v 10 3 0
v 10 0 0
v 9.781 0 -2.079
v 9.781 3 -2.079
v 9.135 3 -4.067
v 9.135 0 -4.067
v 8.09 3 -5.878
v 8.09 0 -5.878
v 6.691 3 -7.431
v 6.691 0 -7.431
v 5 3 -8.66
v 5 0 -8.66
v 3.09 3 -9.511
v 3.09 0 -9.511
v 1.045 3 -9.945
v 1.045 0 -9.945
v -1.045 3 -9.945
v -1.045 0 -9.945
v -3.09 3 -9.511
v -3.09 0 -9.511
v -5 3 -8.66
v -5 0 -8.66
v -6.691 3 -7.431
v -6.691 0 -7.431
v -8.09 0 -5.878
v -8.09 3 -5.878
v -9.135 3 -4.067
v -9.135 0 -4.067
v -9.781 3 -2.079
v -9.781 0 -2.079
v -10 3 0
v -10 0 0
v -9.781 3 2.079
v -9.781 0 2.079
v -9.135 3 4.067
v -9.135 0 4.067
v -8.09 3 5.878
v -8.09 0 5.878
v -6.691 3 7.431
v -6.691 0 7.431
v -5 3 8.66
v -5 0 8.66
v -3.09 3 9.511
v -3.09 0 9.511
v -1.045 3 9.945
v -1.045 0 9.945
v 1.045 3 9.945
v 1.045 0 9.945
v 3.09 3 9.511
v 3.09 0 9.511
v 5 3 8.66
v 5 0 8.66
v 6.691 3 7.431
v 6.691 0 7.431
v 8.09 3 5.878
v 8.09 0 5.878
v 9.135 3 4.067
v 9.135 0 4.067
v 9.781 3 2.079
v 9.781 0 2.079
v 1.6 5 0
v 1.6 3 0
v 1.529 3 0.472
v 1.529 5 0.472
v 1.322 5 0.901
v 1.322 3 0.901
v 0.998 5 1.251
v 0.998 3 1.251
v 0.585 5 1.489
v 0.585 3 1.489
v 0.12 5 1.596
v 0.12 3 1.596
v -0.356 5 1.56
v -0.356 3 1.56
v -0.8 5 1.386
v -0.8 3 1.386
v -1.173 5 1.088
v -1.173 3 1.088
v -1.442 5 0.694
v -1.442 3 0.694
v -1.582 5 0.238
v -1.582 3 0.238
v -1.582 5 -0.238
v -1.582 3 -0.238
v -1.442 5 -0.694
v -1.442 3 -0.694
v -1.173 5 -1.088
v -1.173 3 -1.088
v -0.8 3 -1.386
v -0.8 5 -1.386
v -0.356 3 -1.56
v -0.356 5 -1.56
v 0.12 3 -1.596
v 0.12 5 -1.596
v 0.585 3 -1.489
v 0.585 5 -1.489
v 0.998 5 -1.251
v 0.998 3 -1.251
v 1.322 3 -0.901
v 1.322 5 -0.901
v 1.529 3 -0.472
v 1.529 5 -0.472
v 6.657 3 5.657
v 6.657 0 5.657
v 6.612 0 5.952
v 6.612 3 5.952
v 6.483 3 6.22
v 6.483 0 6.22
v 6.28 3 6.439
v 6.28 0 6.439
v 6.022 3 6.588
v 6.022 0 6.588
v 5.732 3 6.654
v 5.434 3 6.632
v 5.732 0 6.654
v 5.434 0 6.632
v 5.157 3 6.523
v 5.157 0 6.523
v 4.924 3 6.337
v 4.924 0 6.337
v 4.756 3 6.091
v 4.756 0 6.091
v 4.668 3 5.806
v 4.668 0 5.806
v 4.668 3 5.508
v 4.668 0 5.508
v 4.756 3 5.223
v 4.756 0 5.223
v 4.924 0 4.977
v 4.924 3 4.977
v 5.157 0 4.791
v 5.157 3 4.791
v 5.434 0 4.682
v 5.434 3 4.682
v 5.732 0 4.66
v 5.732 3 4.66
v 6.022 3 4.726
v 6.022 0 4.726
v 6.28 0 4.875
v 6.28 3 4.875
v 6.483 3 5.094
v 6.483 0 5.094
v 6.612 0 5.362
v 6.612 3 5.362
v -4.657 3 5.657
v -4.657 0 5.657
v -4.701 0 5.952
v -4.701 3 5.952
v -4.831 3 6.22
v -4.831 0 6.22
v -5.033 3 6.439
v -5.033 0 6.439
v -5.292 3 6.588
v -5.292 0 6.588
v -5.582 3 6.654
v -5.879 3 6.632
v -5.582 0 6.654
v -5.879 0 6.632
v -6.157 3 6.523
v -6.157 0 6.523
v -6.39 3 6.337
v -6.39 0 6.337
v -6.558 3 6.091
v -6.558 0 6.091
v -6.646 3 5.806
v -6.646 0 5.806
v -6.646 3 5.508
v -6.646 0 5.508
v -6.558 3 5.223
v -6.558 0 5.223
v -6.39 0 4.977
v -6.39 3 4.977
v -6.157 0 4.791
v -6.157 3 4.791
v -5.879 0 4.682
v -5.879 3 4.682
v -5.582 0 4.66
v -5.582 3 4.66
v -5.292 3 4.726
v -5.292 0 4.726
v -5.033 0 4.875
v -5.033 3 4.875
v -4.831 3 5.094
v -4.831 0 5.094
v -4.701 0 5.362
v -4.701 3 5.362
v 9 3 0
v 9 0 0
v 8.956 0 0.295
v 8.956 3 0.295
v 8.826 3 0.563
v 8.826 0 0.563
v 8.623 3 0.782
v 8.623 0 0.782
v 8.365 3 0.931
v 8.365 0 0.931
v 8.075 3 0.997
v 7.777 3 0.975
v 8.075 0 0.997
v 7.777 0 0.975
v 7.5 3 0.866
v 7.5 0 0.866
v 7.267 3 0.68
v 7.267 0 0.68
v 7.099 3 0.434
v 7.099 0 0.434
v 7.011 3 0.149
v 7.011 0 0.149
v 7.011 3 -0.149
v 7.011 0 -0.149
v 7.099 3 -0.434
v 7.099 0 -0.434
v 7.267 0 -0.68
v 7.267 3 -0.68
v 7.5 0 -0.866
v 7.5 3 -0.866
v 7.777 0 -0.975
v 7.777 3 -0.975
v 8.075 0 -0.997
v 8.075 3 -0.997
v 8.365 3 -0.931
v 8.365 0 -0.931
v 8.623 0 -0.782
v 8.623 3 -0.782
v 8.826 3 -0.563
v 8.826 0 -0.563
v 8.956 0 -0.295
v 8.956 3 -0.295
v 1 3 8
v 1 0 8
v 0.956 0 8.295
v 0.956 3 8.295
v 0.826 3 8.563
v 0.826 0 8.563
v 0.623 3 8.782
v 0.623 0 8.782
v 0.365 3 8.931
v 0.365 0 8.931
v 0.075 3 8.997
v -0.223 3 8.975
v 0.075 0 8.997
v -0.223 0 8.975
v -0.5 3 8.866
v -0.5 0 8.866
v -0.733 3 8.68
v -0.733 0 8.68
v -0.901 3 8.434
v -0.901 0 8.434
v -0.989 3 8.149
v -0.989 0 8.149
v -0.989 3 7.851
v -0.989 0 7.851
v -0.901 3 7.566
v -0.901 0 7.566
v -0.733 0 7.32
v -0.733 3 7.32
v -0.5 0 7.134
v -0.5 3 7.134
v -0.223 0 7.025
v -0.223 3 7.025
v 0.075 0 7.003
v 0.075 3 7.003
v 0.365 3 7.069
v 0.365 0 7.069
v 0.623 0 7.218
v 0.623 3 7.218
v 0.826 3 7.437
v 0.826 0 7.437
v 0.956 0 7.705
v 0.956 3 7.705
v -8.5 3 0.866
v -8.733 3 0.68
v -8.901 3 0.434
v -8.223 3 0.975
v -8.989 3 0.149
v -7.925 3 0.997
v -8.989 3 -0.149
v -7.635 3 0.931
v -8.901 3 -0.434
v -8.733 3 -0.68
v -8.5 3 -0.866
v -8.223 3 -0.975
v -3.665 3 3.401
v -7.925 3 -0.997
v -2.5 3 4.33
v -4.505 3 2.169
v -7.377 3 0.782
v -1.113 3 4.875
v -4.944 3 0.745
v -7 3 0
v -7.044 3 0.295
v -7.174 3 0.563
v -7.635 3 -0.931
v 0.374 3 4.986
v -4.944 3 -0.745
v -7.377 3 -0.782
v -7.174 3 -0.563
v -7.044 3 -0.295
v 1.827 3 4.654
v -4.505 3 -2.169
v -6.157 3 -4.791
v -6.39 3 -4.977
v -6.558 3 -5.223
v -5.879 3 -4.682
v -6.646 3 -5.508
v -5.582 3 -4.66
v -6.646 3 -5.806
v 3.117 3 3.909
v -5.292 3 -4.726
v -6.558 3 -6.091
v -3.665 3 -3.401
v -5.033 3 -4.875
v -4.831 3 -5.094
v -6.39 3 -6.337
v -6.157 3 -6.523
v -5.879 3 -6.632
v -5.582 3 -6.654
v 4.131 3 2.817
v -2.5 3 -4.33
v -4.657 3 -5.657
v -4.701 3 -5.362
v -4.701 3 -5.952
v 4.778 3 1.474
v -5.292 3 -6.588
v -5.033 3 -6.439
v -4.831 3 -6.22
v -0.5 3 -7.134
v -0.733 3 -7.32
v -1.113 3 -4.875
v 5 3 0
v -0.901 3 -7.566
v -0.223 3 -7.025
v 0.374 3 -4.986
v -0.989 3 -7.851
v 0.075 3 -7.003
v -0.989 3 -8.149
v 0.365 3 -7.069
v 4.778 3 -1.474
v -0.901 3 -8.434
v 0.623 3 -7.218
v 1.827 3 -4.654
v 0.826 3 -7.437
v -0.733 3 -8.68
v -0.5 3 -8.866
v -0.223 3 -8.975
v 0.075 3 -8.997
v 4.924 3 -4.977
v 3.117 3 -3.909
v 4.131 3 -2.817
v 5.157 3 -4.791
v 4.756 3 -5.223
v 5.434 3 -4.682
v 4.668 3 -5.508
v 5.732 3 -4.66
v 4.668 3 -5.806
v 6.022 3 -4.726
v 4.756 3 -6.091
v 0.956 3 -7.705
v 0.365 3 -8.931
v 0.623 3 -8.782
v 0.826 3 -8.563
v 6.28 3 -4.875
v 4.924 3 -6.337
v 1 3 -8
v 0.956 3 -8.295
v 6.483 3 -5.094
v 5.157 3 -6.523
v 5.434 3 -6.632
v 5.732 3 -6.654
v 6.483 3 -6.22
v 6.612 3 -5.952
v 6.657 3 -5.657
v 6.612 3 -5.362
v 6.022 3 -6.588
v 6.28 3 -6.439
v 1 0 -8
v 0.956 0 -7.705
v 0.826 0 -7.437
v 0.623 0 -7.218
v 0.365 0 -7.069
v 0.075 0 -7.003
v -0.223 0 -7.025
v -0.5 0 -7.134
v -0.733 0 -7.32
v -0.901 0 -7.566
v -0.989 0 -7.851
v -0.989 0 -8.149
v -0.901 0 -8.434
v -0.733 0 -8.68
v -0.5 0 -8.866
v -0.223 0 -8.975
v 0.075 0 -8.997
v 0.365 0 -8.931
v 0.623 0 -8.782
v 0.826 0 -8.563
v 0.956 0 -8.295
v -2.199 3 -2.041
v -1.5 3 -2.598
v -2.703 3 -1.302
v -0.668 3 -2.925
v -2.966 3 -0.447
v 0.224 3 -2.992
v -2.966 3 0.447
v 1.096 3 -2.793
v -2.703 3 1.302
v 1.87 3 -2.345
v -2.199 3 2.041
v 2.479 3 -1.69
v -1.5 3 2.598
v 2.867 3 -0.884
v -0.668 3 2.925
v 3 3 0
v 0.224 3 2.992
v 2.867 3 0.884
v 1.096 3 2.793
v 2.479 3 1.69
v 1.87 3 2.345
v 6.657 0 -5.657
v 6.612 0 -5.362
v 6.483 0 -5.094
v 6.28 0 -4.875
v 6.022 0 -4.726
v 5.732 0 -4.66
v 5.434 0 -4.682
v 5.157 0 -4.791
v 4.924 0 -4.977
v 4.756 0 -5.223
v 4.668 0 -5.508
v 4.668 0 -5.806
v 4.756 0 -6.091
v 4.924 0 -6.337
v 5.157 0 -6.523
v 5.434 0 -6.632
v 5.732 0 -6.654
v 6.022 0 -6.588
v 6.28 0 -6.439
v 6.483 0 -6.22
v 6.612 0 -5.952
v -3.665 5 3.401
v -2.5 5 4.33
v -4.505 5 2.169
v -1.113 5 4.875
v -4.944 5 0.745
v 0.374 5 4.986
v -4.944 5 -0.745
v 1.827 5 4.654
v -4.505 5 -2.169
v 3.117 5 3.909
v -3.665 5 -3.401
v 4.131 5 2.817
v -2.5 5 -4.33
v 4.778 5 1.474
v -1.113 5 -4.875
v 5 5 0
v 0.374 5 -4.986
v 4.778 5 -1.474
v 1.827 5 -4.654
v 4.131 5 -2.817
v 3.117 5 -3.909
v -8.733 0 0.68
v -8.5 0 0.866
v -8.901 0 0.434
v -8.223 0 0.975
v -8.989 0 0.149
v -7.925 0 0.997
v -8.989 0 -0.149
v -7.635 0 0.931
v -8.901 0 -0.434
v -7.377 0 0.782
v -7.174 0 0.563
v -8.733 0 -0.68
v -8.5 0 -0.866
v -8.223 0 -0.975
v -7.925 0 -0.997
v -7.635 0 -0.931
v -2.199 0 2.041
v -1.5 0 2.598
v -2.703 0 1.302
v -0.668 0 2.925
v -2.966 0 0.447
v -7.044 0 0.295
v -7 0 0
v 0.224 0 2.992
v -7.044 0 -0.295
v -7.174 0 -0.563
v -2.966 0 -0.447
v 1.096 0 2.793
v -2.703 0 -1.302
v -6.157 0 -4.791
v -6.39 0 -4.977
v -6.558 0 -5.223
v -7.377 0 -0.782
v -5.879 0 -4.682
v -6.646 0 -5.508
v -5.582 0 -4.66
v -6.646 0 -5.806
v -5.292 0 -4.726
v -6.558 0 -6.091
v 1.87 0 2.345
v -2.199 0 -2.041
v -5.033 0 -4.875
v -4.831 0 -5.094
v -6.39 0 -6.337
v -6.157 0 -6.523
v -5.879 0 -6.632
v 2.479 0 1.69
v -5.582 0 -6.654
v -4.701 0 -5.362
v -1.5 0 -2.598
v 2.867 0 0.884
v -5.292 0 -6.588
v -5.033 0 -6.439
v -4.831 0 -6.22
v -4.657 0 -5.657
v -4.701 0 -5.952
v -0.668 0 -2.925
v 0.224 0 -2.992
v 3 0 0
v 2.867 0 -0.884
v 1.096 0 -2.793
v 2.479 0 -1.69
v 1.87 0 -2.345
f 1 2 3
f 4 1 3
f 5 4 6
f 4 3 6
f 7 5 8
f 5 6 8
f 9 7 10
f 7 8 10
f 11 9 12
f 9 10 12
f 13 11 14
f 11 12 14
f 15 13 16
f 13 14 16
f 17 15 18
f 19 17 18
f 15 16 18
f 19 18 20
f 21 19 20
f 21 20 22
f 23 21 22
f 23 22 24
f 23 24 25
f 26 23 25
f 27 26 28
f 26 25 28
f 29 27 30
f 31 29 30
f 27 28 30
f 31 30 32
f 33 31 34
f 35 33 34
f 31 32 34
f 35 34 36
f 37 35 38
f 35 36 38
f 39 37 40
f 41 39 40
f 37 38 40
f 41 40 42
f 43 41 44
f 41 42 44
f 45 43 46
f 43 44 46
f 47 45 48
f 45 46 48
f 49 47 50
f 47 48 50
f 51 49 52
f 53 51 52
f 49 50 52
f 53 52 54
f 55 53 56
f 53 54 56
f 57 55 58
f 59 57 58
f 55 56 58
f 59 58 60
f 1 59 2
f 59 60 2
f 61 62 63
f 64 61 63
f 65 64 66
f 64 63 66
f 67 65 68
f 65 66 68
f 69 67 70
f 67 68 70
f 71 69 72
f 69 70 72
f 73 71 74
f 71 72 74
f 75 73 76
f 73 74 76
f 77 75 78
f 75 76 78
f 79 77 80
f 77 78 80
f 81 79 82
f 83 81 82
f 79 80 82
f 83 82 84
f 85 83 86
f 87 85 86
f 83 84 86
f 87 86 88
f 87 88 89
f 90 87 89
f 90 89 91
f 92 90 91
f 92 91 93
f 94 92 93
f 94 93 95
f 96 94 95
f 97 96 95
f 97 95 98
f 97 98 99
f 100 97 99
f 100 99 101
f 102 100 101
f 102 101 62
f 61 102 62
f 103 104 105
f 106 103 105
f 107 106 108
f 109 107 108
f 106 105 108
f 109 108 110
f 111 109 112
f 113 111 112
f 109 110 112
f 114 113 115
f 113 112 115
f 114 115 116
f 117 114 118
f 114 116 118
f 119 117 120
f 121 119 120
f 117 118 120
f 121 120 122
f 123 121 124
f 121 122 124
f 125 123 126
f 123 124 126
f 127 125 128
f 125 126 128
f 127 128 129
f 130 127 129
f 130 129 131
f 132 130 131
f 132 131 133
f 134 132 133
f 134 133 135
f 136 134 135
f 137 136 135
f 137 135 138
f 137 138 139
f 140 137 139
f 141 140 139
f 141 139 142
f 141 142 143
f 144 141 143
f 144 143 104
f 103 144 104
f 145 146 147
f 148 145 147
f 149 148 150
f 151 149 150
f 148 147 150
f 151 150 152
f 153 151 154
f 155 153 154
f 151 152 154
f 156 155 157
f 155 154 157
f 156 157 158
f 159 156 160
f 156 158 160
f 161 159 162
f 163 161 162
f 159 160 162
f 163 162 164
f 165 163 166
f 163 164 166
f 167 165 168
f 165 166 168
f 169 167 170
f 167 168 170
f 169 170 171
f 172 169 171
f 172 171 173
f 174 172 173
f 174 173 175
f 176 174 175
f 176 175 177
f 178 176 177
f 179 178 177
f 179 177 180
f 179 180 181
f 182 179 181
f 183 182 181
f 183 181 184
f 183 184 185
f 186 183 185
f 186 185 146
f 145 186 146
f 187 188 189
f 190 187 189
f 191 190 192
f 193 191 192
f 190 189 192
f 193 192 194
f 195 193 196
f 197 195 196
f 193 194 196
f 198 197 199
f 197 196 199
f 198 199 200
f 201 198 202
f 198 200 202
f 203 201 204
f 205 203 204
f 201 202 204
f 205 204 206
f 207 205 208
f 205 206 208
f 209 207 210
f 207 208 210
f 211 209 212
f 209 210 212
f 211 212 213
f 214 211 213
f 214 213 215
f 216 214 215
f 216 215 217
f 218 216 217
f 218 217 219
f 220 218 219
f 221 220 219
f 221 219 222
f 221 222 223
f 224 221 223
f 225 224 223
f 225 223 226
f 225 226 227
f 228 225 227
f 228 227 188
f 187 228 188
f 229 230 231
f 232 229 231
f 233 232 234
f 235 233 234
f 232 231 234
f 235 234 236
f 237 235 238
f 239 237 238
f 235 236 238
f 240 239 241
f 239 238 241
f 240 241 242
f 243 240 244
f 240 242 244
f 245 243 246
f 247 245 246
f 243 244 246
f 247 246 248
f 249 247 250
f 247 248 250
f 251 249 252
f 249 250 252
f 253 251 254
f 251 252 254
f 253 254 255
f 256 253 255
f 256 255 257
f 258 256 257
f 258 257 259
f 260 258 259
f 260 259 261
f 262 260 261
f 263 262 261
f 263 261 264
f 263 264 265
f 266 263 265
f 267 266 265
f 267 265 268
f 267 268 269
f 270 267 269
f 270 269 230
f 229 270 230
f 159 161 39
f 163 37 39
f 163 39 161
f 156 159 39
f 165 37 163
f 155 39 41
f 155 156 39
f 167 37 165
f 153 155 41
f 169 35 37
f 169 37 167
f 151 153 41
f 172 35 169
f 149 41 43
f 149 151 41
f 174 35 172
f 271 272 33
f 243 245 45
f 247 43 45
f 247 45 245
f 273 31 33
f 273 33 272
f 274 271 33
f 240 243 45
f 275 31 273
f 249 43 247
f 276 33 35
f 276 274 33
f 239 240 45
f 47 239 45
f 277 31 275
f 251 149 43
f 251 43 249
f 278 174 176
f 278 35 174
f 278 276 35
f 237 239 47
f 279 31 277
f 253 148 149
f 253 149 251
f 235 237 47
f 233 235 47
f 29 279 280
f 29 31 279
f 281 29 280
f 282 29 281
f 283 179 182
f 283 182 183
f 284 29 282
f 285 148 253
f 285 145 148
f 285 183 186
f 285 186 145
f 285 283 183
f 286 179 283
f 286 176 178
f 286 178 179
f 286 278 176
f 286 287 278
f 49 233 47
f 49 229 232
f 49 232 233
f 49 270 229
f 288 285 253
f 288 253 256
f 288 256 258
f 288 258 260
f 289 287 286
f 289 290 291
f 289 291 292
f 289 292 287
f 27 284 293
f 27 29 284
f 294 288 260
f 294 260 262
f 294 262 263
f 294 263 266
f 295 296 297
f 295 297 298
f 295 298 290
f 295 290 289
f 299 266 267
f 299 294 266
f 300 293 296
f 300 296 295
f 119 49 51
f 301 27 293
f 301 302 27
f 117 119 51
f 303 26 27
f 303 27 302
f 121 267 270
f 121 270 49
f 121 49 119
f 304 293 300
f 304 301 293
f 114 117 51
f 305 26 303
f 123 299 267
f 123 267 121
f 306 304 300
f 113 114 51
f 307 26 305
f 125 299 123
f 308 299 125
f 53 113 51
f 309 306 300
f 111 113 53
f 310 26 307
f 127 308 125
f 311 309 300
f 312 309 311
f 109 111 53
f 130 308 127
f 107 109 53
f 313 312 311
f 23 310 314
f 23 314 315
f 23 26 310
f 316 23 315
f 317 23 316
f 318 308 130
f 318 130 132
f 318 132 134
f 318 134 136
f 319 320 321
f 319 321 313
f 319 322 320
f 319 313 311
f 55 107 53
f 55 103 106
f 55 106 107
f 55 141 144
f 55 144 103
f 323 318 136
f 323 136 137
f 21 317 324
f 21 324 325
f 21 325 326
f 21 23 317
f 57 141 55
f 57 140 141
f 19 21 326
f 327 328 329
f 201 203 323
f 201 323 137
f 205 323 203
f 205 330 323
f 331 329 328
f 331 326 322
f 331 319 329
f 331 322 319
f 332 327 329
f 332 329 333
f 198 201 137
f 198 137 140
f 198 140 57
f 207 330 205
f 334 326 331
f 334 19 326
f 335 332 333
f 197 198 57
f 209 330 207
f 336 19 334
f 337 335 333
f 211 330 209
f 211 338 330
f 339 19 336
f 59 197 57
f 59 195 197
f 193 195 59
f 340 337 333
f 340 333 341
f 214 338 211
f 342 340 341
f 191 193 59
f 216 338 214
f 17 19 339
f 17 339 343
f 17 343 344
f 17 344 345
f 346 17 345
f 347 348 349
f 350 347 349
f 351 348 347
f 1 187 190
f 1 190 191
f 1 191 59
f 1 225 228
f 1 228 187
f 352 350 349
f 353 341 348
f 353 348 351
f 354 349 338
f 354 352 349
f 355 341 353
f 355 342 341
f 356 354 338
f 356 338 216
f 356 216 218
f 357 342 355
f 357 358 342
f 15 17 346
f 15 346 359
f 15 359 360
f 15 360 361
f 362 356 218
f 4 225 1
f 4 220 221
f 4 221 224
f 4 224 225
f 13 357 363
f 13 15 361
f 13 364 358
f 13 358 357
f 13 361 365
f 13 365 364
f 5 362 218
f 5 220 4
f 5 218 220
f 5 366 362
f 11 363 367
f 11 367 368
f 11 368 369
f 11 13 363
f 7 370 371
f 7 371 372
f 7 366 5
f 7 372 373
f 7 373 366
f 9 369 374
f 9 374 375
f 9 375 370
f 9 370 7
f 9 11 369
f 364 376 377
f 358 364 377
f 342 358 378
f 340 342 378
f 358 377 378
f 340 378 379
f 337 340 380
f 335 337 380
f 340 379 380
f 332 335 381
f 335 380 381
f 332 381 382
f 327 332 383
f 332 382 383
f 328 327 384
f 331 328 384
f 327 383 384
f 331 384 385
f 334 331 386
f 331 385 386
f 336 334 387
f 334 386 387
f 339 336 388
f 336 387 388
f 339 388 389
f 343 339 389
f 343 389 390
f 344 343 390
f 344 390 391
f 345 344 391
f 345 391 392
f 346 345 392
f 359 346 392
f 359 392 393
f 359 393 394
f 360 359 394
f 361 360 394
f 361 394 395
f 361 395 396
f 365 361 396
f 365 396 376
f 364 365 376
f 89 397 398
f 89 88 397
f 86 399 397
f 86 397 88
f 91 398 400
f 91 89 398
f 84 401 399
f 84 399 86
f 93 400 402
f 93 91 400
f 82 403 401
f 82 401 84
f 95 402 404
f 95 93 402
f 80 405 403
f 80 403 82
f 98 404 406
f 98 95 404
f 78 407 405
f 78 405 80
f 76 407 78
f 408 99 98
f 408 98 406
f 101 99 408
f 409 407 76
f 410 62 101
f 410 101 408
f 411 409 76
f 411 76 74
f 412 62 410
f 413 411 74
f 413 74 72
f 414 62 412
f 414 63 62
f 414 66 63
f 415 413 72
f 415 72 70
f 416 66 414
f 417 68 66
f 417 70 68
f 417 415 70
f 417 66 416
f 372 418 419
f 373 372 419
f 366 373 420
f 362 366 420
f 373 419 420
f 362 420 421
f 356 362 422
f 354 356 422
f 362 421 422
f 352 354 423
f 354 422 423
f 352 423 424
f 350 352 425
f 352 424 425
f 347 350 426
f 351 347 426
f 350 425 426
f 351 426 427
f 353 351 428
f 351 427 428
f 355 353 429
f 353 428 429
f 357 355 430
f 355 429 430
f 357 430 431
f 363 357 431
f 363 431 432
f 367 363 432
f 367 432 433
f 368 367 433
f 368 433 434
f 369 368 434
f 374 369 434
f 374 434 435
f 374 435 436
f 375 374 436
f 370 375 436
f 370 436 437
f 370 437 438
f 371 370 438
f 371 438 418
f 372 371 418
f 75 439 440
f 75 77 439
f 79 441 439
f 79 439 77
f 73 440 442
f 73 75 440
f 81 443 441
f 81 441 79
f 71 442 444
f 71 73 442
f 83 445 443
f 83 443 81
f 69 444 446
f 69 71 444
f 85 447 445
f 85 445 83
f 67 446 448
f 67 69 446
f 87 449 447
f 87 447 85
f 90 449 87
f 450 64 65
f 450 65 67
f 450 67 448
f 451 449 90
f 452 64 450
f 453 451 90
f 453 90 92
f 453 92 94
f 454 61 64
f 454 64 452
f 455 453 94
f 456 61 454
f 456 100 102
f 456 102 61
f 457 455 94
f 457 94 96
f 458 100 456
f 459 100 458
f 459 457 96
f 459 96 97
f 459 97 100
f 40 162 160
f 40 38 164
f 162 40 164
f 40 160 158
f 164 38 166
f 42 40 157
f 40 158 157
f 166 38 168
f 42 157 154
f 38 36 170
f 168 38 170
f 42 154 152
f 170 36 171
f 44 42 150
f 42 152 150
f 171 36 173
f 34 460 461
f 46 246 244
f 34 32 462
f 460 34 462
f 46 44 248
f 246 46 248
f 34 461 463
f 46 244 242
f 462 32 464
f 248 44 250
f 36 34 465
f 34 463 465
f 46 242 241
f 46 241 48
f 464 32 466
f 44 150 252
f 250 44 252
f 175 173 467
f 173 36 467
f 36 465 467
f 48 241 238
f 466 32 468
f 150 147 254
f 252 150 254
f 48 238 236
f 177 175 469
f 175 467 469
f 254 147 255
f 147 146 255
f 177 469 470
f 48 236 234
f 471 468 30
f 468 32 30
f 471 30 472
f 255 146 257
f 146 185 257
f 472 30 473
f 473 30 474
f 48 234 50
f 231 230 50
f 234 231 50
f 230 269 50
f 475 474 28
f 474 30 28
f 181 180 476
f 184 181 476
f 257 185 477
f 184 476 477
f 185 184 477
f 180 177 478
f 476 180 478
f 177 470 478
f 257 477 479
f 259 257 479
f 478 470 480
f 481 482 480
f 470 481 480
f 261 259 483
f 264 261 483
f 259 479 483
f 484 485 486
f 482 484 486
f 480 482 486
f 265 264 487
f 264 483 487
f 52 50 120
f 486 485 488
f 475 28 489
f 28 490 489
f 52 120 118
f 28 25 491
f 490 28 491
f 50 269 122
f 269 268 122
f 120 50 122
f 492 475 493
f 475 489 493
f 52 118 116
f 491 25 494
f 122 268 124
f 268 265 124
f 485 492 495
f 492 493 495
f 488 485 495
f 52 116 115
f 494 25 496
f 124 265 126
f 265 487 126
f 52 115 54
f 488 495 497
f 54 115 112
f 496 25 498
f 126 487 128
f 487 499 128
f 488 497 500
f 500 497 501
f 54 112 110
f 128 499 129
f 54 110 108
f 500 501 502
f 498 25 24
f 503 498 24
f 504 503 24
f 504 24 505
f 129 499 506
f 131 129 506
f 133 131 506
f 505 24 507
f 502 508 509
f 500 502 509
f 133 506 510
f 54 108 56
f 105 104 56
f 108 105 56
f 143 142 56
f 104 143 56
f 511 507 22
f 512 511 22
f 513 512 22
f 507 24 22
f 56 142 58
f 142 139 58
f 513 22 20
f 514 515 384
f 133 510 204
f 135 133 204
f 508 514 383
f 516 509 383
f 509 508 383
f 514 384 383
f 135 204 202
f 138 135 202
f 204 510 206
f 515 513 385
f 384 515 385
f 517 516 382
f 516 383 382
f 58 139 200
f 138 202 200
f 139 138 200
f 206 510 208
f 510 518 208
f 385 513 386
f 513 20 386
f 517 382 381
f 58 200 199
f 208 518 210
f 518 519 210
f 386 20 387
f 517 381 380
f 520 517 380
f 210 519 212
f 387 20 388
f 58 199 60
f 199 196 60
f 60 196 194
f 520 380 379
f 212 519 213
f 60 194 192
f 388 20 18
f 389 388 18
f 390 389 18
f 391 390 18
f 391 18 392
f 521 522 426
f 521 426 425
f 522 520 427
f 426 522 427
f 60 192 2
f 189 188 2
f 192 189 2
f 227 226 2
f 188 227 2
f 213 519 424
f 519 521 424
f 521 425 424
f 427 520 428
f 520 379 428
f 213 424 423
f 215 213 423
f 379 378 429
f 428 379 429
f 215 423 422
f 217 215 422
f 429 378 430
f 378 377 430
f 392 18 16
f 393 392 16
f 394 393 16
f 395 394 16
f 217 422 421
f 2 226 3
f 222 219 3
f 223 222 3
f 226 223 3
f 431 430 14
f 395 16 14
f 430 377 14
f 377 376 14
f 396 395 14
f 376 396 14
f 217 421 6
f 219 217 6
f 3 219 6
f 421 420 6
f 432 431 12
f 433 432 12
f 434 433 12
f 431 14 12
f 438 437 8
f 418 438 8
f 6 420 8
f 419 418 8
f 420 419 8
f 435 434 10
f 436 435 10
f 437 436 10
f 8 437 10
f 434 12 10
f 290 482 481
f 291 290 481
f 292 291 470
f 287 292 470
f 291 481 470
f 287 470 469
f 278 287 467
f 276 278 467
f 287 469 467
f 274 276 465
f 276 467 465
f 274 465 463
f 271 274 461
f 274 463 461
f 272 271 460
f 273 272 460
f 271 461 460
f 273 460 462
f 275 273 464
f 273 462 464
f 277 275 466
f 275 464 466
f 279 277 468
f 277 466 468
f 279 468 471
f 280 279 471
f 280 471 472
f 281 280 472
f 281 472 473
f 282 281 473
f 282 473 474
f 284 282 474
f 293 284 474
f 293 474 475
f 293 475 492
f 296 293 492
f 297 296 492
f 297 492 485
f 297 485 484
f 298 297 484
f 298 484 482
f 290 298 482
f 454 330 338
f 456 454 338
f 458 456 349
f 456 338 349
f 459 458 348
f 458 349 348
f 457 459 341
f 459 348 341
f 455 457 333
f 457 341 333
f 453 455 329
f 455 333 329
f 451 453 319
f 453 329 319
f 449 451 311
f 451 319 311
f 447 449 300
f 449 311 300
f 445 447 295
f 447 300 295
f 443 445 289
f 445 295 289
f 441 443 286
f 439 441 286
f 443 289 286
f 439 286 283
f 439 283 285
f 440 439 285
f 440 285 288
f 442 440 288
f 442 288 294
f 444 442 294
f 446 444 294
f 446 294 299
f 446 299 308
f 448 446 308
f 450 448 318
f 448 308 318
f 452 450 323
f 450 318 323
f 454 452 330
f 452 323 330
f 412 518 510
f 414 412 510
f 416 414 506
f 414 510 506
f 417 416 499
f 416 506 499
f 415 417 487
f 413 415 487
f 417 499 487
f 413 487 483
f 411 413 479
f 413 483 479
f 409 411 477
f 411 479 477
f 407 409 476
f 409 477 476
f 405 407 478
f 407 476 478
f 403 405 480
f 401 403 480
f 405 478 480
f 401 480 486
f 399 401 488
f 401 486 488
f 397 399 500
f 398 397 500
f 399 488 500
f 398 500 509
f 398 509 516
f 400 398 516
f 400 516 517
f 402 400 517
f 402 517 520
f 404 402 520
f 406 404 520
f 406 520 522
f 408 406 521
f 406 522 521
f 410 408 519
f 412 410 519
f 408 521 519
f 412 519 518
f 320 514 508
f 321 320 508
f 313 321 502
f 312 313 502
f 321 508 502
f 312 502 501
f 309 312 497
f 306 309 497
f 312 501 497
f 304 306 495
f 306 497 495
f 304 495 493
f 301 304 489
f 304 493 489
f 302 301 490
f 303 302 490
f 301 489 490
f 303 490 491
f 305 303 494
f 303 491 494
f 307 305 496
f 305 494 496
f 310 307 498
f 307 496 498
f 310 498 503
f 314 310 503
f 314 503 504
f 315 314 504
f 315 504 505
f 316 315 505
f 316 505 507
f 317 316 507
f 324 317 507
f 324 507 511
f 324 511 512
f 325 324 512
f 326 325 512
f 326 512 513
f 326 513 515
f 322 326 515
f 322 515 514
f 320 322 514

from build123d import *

# Parameters (mm, degrees)
SKETCH_1_R          = 10
EXTRUDE_1_DEPTH     = 3
SKETCH_2_R          = 5
EXTRUDE_2_DEPTH     = 2
SKETCH_3_R          = 1.6
SKETCH_3_R_2        = 1
CUT_EXTRUDE_1_DEPTH = 6
SKETCH_4_R          = 3
CUT_EXTRUDE_2_DEPTH = 3


with BuildPart() as part:
    # 草图1 → 凸台-拉伸1 (new body)
    with BuildSketch(Plane(origin=(0, 0, 0), x_dir=(1, 0, 0), z_dir=(0, 1, 0))):
        Circle(SKETCH_1_R)
    extrude(amount=EXTRUDE_1_DEPTH)

    # 草图2 → 凸台-拉伸2 (add)
    with BuildSketch(Plane(origin=(0, 3, 0), x_dir=(1, 0, 0), z_dir=(0, 1, 0))):
        Circle(SKETCH_2_R)
    extrude(amount=EXTRUDE_2_DEPTH)

    # 草图3 → 切除-拉伸1 (cut, through all)
    with BuildSketch(Plane.XZ):
        Circle(SKETCH_3_R)
        with Locations((0, 8)):
            Circle(SKETCH_3_R_2)
        with Locations((5.656854249, 5.656854249)):
            Circle(SKETCH_3_R_2)
        with Locations((8, 0)):
            Circle(SKETCH_3_R_2)
        with Locations((5.656854249, -5.656854249)):
            Circle(SKETCH_3_R_2)
        with Locations((0, -8)):
            Circle(SKETCH_3_R_2)
        with Locations((-5.656854249, -5.656854249)):
            Circle(SKETCH_3_R_2)
        with Locations((-8, 0)):
            Circle(SKETCH_3_R_2)
        with Locations((-5.656854249, 5.656854249)):
            Circle(SKETCH_3_R_2)
    extrude(amount=-CUT_EXTRUDE_1_DEPTH, mode=Mode.SUBTRACT)

    # 草图4 → 切除-拉伸2 (cut)
    with BuildSketch(Plane.XZ):
        Circle(SKETCH_4_R)
    extrude(amount=-CUT_EXTRUDE_2_DEPTH, mode=Mode.SUBTRACT)


solid = part.part
